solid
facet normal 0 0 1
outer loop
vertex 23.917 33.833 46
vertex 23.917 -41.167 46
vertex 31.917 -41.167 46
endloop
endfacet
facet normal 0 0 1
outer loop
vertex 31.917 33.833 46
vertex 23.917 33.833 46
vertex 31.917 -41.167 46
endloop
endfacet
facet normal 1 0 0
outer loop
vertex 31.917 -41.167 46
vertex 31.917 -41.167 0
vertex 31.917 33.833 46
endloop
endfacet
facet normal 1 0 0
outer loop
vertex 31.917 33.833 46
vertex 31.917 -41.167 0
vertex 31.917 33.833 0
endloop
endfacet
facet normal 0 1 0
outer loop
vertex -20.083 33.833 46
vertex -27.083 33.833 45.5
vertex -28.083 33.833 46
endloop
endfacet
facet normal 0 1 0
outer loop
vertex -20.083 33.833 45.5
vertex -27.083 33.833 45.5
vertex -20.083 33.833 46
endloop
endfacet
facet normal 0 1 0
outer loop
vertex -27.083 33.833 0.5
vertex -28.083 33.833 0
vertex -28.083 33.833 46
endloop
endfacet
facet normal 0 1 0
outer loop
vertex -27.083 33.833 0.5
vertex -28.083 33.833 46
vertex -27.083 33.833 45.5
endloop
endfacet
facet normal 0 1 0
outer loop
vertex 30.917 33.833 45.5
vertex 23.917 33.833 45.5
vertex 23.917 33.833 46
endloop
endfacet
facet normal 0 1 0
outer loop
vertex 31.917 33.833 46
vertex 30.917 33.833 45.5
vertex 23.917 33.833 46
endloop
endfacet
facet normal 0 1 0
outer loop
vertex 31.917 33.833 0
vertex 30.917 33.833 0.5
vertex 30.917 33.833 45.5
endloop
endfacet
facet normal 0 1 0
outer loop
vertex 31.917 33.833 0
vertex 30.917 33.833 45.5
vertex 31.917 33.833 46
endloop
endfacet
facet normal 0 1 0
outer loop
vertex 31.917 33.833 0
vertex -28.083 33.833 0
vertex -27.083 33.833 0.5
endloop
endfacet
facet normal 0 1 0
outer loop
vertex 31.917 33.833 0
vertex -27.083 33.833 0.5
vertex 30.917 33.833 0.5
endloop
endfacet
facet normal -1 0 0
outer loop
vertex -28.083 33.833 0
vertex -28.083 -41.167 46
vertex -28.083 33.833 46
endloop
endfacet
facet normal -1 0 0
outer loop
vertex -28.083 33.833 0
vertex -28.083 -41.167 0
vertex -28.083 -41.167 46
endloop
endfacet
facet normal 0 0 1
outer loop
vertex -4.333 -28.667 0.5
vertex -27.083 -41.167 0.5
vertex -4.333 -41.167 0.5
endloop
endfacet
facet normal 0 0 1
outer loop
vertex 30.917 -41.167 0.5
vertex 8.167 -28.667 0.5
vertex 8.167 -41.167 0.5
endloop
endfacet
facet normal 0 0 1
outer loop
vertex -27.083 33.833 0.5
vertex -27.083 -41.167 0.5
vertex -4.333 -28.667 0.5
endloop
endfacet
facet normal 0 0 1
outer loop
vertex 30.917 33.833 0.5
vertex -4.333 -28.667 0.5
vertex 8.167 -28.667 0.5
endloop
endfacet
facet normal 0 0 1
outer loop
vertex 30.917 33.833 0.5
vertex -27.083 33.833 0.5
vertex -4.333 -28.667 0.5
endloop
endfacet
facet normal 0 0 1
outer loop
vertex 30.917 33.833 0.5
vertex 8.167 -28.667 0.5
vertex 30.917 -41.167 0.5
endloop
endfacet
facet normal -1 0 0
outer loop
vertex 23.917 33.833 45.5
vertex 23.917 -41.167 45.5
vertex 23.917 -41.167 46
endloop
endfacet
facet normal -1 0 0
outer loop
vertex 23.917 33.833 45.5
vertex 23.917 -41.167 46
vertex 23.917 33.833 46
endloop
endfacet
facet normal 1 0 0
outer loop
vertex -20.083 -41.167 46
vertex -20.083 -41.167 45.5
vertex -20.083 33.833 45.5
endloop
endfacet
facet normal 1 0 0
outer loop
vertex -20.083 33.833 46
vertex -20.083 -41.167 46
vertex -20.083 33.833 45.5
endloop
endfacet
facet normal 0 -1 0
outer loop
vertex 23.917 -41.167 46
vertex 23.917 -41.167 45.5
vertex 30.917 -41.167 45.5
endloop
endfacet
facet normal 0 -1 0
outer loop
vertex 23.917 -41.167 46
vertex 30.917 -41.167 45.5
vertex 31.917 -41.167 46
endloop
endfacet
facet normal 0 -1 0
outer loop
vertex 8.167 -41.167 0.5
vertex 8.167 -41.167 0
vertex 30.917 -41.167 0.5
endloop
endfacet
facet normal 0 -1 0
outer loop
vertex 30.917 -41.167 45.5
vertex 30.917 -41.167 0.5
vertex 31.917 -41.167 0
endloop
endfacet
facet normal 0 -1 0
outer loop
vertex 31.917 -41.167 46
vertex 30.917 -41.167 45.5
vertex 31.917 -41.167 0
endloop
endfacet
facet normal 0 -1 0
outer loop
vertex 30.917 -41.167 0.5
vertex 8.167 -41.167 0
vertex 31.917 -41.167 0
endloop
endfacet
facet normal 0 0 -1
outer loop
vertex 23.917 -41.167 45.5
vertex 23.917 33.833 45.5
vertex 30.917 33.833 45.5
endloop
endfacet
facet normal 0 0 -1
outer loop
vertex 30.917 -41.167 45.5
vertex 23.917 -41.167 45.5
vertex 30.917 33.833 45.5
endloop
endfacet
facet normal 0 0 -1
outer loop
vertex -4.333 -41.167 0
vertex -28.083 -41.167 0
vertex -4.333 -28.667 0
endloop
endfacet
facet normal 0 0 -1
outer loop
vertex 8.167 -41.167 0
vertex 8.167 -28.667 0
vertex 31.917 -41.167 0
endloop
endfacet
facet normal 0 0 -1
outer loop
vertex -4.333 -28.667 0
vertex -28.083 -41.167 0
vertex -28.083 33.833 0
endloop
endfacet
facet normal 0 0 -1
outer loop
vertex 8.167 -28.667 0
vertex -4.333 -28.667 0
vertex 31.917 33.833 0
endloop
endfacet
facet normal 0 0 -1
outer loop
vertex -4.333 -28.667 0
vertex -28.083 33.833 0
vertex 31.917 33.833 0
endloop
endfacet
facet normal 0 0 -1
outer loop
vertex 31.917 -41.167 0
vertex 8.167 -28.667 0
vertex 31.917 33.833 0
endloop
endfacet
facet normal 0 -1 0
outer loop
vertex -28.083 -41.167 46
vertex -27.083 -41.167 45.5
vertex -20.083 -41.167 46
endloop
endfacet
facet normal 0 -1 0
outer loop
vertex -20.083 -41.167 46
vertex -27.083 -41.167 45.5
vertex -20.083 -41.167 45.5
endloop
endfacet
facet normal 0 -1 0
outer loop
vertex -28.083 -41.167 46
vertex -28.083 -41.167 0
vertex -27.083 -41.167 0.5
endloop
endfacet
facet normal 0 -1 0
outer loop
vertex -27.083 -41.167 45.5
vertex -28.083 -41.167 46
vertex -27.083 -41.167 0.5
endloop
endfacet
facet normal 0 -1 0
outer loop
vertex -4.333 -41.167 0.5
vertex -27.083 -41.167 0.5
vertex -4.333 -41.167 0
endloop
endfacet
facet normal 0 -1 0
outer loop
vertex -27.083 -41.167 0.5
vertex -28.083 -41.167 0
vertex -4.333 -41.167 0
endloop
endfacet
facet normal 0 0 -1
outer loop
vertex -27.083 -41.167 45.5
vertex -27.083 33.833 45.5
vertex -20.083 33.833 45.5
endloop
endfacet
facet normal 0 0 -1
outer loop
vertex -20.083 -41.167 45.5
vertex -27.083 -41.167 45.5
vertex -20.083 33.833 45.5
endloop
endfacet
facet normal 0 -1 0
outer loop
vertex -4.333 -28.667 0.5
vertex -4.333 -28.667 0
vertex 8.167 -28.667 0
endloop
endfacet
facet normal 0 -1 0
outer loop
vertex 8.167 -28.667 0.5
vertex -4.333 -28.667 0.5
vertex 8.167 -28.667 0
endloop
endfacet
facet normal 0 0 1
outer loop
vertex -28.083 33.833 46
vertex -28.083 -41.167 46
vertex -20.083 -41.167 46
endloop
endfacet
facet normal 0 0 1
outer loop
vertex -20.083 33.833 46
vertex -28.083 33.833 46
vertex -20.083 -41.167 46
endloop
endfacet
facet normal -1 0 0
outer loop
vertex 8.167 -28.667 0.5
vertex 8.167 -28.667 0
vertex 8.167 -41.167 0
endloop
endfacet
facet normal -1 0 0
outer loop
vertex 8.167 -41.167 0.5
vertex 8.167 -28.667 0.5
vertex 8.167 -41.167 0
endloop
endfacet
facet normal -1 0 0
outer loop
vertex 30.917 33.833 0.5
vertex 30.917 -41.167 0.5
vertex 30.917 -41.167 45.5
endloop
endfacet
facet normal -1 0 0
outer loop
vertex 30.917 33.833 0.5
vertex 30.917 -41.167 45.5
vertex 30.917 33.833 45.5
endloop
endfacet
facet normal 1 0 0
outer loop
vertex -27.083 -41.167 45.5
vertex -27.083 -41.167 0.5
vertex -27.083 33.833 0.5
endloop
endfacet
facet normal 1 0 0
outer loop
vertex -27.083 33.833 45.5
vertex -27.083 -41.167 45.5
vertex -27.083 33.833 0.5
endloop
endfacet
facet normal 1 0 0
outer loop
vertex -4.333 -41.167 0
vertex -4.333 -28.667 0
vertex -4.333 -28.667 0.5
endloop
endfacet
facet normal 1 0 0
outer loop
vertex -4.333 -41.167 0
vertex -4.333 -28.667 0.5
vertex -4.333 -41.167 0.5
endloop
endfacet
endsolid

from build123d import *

# Parameters (mm, degrees)
F0_W     = 60
F0_H     = 75
F1_DEPTH = 0.5
F2_W     = 1
F2_H     = 75
F3_DEPTH = 45
F4_W     = 8
F4_H     = 75
F5_DEPTH = 0.5
F6_W     = 12.5
F6_H     = 12.5
F7_DEPTH = 0.5


with BuildPart() as f1:
    # F0 (on Top) → F1 (new body)
    with BuildSketch(Plane.XY):
        with Locations((1.917277, -3.667414)):
            Rectangle(F0_W, F0_H)
    extrude(amount=F1_DEPTH)

    # F2 (on face) → F3 (join)
    with BuildSketch(Plane.XY.offset(0.5)):
        with Locations((-27.582723, -3.667414)):
            Rectangle(F2_W, F2_H)
        with Locations((31.417277, -3.667414)):
            Rectangle(F2_W, F2_H)
    extrude(amount=F3_DEPTH)

    # F4 (on face) → F5 (join)
    with BuildSketch(Plane.XY.offset(45.5)):
        with Locations((-24.082723, -3.667414)):
            Rectangle(F4_W, F4_H)
        with Locations((27.917277, -3.667414)):
            Rectangle(F4_W, F4_H)
    extrude(amount=F5_DEPTH)

    # F6 (on face) → F7 (cut, through all)
    with BuildSketch(Plane(origin=(0, 0, 0), x_dir=(1, 0, 0), z_dir=(0, 0, -1))):
        with Locations((1.917277, 34.917414)):
            Rectangle(F6_W, F6_H)
    extrude(amount=-F7_DEPTH, mode=Mode.SUBTRACT)


solid = f1.part
